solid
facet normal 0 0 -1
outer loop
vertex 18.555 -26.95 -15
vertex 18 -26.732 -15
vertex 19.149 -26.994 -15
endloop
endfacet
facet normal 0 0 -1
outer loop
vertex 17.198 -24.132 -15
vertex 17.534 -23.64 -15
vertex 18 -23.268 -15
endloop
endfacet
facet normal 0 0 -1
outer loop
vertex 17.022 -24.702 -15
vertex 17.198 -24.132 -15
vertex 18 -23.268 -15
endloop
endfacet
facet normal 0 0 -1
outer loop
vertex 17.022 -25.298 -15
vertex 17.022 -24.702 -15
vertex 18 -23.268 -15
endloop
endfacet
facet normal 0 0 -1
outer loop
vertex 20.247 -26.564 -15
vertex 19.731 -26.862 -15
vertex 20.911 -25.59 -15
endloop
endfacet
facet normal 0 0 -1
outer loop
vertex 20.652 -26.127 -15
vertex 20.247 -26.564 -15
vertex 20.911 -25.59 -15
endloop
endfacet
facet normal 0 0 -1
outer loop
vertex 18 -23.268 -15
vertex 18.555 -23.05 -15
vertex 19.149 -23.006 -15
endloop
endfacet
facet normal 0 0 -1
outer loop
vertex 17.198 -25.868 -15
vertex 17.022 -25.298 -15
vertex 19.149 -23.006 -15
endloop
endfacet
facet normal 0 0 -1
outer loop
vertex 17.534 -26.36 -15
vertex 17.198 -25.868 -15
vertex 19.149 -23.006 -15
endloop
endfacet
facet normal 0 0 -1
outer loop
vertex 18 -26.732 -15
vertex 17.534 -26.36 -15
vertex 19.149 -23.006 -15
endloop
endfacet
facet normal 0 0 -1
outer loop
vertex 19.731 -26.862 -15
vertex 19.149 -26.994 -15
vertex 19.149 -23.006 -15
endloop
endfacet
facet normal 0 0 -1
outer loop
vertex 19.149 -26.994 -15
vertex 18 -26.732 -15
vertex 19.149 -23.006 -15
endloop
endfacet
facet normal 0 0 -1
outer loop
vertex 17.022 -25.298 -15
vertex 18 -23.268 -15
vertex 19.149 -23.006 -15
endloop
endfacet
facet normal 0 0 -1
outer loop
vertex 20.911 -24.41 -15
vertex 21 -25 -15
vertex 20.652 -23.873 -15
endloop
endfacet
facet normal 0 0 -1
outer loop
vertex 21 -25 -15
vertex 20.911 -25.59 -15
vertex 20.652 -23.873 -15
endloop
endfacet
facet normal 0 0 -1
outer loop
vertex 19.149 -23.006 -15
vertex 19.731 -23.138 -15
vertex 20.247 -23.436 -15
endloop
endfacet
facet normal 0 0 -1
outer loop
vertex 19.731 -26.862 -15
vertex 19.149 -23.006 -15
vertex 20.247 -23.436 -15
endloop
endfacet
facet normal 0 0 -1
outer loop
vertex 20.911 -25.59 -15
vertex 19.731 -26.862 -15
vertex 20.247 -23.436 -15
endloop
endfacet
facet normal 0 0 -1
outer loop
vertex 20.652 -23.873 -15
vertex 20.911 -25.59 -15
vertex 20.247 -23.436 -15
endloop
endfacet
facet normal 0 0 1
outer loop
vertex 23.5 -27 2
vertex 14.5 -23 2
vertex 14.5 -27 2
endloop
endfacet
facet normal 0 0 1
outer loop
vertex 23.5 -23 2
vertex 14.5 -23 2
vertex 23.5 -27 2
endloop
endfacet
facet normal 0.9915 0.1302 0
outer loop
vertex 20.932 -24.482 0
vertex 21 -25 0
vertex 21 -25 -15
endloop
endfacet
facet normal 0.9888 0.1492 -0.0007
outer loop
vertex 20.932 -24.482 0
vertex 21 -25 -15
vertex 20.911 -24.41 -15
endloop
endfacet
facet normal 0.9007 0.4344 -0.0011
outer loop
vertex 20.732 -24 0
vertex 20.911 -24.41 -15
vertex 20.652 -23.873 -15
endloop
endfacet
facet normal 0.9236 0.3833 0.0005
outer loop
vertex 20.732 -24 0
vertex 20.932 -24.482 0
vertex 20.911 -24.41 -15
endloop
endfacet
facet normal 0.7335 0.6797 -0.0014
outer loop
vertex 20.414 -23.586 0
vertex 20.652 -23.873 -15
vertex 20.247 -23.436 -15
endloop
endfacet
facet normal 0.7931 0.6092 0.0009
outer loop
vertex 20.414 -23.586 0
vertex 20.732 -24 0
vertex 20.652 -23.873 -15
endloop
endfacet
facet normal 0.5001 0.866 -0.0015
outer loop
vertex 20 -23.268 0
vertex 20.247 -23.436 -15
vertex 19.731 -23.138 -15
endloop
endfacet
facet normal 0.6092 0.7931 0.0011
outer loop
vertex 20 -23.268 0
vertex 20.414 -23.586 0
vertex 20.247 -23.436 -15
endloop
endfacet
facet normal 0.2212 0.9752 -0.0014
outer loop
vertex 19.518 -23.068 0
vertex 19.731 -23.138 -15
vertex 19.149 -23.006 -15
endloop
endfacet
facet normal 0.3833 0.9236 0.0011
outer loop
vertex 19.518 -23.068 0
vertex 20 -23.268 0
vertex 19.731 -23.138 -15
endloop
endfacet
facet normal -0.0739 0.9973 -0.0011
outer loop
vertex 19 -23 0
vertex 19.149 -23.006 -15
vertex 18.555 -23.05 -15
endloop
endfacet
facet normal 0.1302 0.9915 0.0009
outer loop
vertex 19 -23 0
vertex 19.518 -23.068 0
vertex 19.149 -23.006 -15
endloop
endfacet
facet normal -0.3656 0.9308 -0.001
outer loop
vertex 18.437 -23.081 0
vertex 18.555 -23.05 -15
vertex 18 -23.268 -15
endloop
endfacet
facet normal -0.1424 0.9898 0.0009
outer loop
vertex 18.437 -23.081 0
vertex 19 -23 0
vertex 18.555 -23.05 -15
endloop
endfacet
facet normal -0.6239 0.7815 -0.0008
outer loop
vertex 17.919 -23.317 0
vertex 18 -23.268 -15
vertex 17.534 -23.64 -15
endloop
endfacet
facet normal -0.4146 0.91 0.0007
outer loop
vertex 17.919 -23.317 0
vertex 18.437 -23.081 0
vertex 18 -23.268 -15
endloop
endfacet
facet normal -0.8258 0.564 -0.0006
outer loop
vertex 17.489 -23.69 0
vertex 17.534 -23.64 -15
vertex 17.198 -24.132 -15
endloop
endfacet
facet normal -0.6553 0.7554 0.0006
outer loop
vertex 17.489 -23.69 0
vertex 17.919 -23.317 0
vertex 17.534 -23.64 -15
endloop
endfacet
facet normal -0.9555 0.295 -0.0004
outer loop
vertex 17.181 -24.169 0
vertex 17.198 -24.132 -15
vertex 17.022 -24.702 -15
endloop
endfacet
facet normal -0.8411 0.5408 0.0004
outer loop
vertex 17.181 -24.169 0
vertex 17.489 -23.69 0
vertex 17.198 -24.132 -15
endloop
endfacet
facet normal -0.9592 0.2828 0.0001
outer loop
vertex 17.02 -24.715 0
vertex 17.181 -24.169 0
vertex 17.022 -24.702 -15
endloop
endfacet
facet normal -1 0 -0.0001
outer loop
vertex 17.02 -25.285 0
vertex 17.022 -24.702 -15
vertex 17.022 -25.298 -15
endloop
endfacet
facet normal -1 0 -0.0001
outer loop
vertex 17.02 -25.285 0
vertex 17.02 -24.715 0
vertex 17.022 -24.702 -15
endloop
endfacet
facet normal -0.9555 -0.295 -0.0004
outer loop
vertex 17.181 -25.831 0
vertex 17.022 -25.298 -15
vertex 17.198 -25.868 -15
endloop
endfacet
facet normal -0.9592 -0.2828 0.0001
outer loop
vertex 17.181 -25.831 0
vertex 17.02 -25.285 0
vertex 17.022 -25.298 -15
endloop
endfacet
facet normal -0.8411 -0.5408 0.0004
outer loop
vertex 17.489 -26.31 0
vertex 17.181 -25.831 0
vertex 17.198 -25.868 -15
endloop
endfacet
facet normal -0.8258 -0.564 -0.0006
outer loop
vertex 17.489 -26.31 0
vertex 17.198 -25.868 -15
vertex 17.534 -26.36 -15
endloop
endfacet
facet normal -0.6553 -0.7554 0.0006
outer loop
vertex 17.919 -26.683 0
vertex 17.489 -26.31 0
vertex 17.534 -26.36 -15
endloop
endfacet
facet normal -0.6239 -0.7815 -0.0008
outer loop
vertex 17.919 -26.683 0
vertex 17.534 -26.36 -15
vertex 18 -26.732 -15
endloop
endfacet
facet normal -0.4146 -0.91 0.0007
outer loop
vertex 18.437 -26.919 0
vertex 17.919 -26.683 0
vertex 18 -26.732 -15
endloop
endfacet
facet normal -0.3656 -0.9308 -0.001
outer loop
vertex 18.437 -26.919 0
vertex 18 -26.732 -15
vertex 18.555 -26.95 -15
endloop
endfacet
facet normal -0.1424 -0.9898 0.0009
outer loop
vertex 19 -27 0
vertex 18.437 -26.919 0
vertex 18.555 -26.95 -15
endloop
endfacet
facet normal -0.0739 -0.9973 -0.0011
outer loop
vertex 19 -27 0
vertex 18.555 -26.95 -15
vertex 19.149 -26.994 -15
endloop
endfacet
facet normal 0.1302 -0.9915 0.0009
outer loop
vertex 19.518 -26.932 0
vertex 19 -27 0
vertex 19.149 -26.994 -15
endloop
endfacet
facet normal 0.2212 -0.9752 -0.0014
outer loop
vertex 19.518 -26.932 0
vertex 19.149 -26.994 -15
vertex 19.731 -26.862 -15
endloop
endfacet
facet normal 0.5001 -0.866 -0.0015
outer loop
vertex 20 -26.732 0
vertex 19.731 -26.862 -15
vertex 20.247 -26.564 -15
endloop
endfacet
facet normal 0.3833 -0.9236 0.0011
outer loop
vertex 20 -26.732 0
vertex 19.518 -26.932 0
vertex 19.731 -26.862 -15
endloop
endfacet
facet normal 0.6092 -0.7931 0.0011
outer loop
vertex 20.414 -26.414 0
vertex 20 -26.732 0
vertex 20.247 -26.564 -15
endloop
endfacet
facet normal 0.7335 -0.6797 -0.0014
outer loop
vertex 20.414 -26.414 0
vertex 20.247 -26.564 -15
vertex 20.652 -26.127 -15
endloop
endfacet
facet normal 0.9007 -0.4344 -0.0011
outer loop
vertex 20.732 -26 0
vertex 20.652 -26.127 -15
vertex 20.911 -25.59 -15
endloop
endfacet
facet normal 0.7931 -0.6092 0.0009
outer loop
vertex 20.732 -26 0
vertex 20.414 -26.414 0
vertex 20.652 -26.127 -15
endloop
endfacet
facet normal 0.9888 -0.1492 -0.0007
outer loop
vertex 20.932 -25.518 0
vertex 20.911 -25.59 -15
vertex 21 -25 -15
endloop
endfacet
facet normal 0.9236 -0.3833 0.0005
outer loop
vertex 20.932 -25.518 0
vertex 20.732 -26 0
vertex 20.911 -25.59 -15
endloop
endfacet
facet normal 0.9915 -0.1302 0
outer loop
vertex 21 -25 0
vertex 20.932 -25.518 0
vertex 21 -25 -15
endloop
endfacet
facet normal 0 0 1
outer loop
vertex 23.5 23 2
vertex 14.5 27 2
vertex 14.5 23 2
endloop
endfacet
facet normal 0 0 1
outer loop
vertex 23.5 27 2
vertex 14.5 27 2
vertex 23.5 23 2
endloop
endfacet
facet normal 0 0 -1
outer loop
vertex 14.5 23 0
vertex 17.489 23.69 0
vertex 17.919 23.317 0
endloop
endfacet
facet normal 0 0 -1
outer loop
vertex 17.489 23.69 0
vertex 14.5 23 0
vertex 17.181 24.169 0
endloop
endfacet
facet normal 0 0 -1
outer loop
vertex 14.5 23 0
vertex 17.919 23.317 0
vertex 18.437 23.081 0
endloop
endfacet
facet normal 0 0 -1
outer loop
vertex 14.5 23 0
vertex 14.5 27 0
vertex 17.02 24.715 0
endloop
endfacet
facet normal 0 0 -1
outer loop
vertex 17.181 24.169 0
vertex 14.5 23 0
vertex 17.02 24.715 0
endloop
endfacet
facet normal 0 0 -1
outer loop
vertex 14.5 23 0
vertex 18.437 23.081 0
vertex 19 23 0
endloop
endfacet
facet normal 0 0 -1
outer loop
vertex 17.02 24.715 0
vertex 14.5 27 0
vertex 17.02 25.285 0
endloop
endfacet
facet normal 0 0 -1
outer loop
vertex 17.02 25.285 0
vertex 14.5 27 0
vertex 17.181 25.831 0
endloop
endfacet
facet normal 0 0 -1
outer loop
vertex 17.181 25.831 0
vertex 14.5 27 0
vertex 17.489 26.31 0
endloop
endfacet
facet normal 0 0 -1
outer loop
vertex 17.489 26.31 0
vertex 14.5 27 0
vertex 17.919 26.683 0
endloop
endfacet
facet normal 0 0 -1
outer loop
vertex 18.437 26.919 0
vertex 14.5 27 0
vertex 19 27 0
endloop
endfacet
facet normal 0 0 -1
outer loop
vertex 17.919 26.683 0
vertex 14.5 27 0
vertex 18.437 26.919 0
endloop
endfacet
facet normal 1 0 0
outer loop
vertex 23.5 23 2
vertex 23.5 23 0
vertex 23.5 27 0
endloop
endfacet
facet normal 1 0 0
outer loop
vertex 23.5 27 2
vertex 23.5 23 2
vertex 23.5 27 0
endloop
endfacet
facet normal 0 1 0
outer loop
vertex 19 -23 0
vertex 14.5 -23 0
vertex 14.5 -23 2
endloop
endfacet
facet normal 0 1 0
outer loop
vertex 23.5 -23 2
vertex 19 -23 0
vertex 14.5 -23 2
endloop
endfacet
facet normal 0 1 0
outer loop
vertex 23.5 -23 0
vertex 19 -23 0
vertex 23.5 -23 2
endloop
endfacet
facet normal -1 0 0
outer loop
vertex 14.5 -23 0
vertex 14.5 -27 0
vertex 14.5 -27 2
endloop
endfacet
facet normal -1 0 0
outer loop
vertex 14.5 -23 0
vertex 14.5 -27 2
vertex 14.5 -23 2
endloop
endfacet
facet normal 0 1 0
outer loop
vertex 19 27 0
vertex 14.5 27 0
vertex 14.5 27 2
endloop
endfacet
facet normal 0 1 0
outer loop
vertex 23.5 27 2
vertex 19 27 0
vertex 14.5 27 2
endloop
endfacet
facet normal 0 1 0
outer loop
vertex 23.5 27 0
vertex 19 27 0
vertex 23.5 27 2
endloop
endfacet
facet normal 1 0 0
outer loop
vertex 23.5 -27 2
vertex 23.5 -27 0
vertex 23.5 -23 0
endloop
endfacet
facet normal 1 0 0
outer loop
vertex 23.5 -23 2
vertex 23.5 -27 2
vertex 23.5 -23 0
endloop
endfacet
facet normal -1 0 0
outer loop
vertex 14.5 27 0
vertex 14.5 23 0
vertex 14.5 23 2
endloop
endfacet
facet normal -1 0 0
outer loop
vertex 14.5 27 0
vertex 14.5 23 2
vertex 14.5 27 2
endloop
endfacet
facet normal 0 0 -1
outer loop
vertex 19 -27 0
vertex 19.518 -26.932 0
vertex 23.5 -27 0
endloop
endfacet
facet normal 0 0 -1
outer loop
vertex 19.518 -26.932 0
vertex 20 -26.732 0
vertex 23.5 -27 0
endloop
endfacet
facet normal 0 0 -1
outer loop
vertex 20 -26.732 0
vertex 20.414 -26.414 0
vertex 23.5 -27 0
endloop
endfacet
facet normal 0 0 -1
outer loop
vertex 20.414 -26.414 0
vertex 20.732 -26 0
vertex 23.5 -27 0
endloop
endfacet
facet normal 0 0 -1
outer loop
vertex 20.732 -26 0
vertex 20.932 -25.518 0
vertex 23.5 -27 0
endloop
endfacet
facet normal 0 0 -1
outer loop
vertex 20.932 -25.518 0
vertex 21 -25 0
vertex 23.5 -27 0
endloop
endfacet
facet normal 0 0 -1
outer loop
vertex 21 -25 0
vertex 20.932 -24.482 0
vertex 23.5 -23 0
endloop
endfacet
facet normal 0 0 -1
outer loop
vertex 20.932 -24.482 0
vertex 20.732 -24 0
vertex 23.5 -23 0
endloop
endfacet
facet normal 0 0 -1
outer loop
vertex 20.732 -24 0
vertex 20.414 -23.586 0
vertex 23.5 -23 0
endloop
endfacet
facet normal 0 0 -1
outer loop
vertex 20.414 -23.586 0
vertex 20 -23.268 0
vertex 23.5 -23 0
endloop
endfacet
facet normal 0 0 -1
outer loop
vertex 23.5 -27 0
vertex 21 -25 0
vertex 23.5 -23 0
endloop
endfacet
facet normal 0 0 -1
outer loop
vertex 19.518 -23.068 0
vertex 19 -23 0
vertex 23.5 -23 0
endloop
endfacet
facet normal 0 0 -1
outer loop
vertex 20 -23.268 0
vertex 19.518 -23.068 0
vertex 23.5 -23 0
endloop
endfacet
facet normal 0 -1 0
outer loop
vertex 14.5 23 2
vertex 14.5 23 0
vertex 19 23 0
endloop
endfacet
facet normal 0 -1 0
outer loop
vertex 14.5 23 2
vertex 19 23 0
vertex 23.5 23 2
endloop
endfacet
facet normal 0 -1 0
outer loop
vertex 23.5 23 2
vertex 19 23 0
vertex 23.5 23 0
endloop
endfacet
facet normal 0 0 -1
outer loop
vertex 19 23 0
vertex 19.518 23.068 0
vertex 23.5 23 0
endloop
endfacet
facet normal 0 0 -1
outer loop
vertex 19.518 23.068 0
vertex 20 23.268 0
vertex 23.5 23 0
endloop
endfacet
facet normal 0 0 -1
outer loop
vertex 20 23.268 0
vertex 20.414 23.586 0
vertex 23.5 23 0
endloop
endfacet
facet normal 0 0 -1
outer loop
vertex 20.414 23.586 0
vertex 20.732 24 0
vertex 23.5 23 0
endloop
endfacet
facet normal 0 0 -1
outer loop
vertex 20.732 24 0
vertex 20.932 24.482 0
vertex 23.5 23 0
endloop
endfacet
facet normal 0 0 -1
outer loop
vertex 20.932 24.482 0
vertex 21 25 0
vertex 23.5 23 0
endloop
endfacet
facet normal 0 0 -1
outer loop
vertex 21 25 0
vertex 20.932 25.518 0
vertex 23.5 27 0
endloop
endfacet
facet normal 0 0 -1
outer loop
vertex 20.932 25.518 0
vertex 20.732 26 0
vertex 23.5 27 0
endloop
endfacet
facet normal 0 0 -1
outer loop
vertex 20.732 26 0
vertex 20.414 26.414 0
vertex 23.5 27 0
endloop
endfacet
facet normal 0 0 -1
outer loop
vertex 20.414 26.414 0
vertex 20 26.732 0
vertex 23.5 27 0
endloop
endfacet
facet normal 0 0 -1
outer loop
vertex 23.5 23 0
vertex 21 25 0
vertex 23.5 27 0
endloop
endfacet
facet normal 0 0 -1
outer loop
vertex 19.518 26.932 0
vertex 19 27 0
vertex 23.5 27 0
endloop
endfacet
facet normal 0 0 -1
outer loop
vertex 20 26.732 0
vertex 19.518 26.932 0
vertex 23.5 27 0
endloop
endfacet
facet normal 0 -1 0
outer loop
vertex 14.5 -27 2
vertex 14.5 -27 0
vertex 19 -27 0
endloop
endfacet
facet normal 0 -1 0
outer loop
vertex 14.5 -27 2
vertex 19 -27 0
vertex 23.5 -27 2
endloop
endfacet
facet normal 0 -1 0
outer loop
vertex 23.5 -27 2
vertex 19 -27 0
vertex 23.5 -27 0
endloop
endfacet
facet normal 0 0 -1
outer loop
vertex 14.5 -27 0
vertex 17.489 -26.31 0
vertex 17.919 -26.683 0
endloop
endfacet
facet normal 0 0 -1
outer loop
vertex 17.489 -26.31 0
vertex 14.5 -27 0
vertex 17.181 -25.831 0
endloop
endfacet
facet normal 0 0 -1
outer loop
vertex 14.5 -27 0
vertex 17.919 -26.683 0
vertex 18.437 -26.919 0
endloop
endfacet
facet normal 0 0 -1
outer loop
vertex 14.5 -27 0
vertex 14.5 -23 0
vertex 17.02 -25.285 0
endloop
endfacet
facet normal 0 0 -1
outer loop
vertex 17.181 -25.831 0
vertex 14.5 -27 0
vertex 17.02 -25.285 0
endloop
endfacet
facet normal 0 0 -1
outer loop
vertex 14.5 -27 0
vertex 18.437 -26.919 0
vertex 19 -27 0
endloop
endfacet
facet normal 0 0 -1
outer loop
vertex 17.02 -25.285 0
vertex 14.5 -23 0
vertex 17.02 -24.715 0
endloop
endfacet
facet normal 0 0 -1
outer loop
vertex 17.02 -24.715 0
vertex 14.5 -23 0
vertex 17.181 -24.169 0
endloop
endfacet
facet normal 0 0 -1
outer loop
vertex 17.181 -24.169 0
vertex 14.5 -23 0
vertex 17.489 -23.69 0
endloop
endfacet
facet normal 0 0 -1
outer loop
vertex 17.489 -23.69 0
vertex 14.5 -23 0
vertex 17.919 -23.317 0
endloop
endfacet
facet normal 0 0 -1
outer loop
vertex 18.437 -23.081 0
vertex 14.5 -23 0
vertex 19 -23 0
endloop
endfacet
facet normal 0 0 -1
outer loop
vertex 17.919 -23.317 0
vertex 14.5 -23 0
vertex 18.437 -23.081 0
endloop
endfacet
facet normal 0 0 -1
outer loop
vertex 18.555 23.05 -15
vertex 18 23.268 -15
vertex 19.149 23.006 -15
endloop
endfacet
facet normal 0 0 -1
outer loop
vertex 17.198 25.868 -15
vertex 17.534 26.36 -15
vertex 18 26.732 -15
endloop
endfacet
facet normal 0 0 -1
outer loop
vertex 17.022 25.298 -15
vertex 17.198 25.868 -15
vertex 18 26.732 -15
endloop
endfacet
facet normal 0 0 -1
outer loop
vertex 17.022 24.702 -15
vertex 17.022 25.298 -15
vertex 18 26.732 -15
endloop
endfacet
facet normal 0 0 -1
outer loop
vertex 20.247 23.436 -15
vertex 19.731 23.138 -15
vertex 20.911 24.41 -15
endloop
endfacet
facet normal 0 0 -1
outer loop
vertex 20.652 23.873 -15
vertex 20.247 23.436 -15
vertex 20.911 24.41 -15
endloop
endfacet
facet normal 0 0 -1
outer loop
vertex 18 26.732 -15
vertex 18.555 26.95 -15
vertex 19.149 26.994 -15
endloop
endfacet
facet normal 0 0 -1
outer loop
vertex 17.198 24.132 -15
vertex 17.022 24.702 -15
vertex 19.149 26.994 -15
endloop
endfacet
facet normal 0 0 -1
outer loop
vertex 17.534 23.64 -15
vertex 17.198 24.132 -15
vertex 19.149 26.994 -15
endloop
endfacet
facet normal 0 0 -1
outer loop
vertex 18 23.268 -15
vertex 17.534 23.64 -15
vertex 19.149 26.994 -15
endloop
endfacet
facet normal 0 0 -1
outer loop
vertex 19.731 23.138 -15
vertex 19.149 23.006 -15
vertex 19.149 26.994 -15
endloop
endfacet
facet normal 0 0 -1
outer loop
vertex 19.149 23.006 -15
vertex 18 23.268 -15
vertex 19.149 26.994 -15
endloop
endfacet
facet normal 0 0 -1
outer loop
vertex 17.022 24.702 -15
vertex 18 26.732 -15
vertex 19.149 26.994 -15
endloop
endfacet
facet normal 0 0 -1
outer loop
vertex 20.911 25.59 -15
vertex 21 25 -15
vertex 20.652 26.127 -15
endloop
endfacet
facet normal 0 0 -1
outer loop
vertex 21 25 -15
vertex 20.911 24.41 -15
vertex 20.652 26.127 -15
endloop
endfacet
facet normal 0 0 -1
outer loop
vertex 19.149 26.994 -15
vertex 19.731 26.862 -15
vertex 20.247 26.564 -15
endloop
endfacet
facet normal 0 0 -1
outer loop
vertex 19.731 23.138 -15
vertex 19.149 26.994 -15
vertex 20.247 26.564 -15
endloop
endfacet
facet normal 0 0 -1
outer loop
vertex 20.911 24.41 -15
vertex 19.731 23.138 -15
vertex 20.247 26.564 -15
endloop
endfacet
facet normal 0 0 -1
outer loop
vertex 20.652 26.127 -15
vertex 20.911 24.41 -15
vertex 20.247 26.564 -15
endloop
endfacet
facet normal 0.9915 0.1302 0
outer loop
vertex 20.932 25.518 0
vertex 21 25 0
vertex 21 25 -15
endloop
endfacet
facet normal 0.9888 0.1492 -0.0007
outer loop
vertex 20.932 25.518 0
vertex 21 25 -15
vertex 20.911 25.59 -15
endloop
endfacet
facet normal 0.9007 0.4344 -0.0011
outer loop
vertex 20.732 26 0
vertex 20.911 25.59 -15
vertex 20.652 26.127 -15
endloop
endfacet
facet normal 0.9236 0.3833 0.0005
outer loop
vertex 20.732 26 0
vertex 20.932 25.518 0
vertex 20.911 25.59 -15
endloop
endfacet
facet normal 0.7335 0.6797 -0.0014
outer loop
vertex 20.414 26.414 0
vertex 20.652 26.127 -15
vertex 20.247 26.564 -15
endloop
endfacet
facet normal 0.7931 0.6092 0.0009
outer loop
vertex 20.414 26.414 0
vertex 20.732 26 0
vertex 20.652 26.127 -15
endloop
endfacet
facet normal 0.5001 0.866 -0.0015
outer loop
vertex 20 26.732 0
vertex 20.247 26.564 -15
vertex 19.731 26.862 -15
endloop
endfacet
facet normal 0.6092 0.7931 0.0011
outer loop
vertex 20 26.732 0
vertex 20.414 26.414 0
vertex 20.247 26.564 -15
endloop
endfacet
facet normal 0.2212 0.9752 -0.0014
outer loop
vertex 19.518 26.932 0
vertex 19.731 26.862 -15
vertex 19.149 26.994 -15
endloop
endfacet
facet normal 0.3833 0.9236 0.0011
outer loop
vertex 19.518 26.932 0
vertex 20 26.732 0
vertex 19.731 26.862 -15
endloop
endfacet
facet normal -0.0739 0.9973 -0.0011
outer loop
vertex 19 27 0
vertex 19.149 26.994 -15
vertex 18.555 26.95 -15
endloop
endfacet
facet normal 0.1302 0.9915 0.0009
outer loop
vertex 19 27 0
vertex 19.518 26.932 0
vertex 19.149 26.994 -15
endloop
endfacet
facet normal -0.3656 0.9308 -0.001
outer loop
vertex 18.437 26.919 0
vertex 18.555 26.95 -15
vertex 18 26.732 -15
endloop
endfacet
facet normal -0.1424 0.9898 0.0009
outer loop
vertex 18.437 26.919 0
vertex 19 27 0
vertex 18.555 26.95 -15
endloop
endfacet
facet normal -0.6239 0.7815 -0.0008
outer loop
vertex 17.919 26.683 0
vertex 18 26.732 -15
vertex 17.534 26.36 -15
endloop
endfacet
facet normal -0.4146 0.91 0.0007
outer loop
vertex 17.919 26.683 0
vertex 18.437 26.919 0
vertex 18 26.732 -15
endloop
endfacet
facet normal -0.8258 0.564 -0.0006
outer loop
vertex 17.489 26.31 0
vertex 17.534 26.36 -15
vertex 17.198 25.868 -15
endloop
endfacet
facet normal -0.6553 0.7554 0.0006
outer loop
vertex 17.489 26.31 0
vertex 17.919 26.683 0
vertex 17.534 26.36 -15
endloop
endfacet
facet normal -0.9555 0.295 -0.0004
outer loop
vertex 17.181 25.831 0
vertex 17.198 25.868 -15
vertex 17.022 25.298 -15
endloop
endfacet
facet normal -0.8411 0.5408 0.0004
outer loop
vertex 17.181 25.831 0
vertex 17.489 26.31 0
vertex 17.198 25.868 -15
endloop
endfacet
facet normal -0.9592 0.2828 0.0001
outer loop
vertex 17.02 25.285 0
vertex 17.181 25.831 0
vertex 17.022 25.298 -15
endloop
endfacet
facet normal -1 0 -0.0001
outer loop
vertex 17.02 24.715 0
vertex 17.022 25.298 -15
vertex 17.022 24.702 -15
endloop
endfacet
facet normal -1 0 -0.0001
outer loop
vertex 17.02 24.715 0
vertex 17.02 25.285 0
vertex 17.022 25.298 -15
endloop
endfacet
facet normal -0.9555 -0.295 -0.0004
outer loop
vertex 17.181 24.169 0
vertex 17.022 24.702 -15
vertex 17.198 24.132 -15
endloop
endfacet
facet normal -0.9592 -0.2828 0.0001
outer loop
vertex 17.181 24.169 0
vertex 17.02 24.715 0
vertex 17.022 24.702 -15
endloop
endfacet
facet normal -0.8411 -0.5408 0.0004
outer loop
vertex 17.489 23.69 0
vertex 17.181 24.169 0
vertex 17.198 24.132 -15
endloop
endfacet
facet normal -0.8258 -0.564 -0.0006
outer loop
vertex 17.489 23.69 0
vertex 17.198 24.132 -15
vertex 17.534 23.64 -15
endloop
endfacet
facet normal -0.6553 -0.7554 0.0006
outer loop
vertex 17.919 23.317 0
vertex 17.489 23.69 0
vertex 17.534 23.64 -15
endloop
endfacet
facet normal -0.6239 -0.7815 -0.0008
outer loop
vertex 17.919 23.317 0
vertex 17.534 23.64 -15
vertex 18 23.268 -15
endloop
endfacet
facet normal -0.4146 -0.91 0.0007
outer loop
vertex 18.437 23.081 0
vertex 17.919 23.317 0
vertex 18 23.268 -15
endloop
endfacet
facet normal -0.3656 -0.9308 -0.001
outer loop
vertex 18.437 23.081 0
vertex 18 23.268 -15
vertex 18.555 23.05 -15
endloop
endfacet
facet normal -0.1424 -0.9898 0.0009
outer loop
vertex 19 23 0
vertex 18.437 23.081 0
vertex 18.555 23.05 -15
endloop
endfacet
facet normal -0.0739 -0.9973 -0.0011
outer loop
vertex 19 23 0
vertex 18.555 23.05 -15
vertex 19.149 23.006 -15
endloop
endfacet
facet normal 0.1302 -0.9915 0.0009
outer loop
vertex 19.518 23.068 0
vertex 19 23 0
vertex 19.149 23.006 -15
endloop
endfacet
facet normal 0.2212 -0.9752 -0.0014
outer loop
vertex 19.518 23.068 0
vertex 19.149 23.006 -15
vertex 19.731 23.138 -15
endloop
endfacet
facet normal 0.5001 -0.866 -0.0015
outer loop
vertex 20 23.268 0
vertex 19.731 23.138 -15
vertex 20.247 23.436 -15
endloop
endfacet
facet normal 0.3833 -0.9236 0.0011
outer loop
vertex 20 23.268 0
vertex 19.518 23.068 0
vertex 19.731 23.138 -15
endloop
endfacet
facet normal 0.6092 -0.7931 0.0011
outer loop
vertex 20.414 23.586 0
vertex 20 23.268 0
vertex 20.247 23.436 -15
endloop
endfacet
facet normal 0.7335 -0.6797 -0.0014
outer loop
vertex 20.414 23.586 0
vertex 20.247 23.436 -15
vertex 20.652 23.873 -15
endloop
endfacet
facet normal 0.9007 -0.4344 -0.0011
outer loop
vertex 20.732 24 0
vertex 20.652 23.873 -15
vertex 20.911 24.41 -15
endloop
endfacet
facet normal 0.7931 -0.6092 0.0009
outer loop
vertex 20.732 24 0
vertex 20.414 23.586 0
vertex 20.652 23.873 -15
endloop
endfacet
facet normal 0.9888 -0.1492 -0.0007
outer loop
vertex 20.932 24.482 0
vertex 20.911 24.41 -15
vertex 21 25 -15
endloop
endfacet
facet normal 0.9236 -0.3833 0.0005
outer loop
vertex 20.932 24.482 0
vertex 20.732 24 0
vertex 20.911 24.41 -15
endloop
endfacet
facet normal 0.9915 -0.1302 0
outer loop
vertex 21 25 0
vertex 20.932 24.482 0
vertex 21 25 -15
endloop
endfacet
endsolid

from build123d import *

# Parameters (mm, degrees)
SKETCH1_R             = 2
BOSS_EXTRUDE1_DEPTH   = 15
BOSS_EXTRUDE1_2_DEPTH = 15
SKETCH1_3_W           = 9
SKETCH1_3_H           = 4
BOSS_EXTRUDE2_DEPTH   = 2


with BuildPart() as part:
    # Sketch1 → Boss-Extrude1 (new body)
    with BuildSketch(Plane.XY):
        with Locations((19, -25)):
            Circle(SKETCH1_R)
    extrude(amount=-BOSS_EXTRUDE1_DEPTH)



with BuildPart() as body_2:
    # Sketch1 → Boss-Extrude1 2 (new body)
    with BuildSketch(Plane.XY):
        with Locations((19, 25)):
            Circle(SKETCH1_R)
    extrude(amount=-BOSS_EXTRUDE1_2_DEPTH)


with BuildPart() as part_1:
    add(part.part)

    add(body_2.part)  # Boss-Extrude2 merges body 2
    # Sketch1<3> → Boss-Extrude2 (add)
    with BuildSketch(Plane.XY):
        with Locations((19, -25)):
            Rectangle(SKETCH1_3_W, SKETCH1_3_H)
        with Locations((19, 25)):
            Rectangle(SKETCH1_3_W, SKETCH1_3_H)
    extrude(amount=BOSS_EXTRUDE2_DEPTH)


solid = part_1.part
